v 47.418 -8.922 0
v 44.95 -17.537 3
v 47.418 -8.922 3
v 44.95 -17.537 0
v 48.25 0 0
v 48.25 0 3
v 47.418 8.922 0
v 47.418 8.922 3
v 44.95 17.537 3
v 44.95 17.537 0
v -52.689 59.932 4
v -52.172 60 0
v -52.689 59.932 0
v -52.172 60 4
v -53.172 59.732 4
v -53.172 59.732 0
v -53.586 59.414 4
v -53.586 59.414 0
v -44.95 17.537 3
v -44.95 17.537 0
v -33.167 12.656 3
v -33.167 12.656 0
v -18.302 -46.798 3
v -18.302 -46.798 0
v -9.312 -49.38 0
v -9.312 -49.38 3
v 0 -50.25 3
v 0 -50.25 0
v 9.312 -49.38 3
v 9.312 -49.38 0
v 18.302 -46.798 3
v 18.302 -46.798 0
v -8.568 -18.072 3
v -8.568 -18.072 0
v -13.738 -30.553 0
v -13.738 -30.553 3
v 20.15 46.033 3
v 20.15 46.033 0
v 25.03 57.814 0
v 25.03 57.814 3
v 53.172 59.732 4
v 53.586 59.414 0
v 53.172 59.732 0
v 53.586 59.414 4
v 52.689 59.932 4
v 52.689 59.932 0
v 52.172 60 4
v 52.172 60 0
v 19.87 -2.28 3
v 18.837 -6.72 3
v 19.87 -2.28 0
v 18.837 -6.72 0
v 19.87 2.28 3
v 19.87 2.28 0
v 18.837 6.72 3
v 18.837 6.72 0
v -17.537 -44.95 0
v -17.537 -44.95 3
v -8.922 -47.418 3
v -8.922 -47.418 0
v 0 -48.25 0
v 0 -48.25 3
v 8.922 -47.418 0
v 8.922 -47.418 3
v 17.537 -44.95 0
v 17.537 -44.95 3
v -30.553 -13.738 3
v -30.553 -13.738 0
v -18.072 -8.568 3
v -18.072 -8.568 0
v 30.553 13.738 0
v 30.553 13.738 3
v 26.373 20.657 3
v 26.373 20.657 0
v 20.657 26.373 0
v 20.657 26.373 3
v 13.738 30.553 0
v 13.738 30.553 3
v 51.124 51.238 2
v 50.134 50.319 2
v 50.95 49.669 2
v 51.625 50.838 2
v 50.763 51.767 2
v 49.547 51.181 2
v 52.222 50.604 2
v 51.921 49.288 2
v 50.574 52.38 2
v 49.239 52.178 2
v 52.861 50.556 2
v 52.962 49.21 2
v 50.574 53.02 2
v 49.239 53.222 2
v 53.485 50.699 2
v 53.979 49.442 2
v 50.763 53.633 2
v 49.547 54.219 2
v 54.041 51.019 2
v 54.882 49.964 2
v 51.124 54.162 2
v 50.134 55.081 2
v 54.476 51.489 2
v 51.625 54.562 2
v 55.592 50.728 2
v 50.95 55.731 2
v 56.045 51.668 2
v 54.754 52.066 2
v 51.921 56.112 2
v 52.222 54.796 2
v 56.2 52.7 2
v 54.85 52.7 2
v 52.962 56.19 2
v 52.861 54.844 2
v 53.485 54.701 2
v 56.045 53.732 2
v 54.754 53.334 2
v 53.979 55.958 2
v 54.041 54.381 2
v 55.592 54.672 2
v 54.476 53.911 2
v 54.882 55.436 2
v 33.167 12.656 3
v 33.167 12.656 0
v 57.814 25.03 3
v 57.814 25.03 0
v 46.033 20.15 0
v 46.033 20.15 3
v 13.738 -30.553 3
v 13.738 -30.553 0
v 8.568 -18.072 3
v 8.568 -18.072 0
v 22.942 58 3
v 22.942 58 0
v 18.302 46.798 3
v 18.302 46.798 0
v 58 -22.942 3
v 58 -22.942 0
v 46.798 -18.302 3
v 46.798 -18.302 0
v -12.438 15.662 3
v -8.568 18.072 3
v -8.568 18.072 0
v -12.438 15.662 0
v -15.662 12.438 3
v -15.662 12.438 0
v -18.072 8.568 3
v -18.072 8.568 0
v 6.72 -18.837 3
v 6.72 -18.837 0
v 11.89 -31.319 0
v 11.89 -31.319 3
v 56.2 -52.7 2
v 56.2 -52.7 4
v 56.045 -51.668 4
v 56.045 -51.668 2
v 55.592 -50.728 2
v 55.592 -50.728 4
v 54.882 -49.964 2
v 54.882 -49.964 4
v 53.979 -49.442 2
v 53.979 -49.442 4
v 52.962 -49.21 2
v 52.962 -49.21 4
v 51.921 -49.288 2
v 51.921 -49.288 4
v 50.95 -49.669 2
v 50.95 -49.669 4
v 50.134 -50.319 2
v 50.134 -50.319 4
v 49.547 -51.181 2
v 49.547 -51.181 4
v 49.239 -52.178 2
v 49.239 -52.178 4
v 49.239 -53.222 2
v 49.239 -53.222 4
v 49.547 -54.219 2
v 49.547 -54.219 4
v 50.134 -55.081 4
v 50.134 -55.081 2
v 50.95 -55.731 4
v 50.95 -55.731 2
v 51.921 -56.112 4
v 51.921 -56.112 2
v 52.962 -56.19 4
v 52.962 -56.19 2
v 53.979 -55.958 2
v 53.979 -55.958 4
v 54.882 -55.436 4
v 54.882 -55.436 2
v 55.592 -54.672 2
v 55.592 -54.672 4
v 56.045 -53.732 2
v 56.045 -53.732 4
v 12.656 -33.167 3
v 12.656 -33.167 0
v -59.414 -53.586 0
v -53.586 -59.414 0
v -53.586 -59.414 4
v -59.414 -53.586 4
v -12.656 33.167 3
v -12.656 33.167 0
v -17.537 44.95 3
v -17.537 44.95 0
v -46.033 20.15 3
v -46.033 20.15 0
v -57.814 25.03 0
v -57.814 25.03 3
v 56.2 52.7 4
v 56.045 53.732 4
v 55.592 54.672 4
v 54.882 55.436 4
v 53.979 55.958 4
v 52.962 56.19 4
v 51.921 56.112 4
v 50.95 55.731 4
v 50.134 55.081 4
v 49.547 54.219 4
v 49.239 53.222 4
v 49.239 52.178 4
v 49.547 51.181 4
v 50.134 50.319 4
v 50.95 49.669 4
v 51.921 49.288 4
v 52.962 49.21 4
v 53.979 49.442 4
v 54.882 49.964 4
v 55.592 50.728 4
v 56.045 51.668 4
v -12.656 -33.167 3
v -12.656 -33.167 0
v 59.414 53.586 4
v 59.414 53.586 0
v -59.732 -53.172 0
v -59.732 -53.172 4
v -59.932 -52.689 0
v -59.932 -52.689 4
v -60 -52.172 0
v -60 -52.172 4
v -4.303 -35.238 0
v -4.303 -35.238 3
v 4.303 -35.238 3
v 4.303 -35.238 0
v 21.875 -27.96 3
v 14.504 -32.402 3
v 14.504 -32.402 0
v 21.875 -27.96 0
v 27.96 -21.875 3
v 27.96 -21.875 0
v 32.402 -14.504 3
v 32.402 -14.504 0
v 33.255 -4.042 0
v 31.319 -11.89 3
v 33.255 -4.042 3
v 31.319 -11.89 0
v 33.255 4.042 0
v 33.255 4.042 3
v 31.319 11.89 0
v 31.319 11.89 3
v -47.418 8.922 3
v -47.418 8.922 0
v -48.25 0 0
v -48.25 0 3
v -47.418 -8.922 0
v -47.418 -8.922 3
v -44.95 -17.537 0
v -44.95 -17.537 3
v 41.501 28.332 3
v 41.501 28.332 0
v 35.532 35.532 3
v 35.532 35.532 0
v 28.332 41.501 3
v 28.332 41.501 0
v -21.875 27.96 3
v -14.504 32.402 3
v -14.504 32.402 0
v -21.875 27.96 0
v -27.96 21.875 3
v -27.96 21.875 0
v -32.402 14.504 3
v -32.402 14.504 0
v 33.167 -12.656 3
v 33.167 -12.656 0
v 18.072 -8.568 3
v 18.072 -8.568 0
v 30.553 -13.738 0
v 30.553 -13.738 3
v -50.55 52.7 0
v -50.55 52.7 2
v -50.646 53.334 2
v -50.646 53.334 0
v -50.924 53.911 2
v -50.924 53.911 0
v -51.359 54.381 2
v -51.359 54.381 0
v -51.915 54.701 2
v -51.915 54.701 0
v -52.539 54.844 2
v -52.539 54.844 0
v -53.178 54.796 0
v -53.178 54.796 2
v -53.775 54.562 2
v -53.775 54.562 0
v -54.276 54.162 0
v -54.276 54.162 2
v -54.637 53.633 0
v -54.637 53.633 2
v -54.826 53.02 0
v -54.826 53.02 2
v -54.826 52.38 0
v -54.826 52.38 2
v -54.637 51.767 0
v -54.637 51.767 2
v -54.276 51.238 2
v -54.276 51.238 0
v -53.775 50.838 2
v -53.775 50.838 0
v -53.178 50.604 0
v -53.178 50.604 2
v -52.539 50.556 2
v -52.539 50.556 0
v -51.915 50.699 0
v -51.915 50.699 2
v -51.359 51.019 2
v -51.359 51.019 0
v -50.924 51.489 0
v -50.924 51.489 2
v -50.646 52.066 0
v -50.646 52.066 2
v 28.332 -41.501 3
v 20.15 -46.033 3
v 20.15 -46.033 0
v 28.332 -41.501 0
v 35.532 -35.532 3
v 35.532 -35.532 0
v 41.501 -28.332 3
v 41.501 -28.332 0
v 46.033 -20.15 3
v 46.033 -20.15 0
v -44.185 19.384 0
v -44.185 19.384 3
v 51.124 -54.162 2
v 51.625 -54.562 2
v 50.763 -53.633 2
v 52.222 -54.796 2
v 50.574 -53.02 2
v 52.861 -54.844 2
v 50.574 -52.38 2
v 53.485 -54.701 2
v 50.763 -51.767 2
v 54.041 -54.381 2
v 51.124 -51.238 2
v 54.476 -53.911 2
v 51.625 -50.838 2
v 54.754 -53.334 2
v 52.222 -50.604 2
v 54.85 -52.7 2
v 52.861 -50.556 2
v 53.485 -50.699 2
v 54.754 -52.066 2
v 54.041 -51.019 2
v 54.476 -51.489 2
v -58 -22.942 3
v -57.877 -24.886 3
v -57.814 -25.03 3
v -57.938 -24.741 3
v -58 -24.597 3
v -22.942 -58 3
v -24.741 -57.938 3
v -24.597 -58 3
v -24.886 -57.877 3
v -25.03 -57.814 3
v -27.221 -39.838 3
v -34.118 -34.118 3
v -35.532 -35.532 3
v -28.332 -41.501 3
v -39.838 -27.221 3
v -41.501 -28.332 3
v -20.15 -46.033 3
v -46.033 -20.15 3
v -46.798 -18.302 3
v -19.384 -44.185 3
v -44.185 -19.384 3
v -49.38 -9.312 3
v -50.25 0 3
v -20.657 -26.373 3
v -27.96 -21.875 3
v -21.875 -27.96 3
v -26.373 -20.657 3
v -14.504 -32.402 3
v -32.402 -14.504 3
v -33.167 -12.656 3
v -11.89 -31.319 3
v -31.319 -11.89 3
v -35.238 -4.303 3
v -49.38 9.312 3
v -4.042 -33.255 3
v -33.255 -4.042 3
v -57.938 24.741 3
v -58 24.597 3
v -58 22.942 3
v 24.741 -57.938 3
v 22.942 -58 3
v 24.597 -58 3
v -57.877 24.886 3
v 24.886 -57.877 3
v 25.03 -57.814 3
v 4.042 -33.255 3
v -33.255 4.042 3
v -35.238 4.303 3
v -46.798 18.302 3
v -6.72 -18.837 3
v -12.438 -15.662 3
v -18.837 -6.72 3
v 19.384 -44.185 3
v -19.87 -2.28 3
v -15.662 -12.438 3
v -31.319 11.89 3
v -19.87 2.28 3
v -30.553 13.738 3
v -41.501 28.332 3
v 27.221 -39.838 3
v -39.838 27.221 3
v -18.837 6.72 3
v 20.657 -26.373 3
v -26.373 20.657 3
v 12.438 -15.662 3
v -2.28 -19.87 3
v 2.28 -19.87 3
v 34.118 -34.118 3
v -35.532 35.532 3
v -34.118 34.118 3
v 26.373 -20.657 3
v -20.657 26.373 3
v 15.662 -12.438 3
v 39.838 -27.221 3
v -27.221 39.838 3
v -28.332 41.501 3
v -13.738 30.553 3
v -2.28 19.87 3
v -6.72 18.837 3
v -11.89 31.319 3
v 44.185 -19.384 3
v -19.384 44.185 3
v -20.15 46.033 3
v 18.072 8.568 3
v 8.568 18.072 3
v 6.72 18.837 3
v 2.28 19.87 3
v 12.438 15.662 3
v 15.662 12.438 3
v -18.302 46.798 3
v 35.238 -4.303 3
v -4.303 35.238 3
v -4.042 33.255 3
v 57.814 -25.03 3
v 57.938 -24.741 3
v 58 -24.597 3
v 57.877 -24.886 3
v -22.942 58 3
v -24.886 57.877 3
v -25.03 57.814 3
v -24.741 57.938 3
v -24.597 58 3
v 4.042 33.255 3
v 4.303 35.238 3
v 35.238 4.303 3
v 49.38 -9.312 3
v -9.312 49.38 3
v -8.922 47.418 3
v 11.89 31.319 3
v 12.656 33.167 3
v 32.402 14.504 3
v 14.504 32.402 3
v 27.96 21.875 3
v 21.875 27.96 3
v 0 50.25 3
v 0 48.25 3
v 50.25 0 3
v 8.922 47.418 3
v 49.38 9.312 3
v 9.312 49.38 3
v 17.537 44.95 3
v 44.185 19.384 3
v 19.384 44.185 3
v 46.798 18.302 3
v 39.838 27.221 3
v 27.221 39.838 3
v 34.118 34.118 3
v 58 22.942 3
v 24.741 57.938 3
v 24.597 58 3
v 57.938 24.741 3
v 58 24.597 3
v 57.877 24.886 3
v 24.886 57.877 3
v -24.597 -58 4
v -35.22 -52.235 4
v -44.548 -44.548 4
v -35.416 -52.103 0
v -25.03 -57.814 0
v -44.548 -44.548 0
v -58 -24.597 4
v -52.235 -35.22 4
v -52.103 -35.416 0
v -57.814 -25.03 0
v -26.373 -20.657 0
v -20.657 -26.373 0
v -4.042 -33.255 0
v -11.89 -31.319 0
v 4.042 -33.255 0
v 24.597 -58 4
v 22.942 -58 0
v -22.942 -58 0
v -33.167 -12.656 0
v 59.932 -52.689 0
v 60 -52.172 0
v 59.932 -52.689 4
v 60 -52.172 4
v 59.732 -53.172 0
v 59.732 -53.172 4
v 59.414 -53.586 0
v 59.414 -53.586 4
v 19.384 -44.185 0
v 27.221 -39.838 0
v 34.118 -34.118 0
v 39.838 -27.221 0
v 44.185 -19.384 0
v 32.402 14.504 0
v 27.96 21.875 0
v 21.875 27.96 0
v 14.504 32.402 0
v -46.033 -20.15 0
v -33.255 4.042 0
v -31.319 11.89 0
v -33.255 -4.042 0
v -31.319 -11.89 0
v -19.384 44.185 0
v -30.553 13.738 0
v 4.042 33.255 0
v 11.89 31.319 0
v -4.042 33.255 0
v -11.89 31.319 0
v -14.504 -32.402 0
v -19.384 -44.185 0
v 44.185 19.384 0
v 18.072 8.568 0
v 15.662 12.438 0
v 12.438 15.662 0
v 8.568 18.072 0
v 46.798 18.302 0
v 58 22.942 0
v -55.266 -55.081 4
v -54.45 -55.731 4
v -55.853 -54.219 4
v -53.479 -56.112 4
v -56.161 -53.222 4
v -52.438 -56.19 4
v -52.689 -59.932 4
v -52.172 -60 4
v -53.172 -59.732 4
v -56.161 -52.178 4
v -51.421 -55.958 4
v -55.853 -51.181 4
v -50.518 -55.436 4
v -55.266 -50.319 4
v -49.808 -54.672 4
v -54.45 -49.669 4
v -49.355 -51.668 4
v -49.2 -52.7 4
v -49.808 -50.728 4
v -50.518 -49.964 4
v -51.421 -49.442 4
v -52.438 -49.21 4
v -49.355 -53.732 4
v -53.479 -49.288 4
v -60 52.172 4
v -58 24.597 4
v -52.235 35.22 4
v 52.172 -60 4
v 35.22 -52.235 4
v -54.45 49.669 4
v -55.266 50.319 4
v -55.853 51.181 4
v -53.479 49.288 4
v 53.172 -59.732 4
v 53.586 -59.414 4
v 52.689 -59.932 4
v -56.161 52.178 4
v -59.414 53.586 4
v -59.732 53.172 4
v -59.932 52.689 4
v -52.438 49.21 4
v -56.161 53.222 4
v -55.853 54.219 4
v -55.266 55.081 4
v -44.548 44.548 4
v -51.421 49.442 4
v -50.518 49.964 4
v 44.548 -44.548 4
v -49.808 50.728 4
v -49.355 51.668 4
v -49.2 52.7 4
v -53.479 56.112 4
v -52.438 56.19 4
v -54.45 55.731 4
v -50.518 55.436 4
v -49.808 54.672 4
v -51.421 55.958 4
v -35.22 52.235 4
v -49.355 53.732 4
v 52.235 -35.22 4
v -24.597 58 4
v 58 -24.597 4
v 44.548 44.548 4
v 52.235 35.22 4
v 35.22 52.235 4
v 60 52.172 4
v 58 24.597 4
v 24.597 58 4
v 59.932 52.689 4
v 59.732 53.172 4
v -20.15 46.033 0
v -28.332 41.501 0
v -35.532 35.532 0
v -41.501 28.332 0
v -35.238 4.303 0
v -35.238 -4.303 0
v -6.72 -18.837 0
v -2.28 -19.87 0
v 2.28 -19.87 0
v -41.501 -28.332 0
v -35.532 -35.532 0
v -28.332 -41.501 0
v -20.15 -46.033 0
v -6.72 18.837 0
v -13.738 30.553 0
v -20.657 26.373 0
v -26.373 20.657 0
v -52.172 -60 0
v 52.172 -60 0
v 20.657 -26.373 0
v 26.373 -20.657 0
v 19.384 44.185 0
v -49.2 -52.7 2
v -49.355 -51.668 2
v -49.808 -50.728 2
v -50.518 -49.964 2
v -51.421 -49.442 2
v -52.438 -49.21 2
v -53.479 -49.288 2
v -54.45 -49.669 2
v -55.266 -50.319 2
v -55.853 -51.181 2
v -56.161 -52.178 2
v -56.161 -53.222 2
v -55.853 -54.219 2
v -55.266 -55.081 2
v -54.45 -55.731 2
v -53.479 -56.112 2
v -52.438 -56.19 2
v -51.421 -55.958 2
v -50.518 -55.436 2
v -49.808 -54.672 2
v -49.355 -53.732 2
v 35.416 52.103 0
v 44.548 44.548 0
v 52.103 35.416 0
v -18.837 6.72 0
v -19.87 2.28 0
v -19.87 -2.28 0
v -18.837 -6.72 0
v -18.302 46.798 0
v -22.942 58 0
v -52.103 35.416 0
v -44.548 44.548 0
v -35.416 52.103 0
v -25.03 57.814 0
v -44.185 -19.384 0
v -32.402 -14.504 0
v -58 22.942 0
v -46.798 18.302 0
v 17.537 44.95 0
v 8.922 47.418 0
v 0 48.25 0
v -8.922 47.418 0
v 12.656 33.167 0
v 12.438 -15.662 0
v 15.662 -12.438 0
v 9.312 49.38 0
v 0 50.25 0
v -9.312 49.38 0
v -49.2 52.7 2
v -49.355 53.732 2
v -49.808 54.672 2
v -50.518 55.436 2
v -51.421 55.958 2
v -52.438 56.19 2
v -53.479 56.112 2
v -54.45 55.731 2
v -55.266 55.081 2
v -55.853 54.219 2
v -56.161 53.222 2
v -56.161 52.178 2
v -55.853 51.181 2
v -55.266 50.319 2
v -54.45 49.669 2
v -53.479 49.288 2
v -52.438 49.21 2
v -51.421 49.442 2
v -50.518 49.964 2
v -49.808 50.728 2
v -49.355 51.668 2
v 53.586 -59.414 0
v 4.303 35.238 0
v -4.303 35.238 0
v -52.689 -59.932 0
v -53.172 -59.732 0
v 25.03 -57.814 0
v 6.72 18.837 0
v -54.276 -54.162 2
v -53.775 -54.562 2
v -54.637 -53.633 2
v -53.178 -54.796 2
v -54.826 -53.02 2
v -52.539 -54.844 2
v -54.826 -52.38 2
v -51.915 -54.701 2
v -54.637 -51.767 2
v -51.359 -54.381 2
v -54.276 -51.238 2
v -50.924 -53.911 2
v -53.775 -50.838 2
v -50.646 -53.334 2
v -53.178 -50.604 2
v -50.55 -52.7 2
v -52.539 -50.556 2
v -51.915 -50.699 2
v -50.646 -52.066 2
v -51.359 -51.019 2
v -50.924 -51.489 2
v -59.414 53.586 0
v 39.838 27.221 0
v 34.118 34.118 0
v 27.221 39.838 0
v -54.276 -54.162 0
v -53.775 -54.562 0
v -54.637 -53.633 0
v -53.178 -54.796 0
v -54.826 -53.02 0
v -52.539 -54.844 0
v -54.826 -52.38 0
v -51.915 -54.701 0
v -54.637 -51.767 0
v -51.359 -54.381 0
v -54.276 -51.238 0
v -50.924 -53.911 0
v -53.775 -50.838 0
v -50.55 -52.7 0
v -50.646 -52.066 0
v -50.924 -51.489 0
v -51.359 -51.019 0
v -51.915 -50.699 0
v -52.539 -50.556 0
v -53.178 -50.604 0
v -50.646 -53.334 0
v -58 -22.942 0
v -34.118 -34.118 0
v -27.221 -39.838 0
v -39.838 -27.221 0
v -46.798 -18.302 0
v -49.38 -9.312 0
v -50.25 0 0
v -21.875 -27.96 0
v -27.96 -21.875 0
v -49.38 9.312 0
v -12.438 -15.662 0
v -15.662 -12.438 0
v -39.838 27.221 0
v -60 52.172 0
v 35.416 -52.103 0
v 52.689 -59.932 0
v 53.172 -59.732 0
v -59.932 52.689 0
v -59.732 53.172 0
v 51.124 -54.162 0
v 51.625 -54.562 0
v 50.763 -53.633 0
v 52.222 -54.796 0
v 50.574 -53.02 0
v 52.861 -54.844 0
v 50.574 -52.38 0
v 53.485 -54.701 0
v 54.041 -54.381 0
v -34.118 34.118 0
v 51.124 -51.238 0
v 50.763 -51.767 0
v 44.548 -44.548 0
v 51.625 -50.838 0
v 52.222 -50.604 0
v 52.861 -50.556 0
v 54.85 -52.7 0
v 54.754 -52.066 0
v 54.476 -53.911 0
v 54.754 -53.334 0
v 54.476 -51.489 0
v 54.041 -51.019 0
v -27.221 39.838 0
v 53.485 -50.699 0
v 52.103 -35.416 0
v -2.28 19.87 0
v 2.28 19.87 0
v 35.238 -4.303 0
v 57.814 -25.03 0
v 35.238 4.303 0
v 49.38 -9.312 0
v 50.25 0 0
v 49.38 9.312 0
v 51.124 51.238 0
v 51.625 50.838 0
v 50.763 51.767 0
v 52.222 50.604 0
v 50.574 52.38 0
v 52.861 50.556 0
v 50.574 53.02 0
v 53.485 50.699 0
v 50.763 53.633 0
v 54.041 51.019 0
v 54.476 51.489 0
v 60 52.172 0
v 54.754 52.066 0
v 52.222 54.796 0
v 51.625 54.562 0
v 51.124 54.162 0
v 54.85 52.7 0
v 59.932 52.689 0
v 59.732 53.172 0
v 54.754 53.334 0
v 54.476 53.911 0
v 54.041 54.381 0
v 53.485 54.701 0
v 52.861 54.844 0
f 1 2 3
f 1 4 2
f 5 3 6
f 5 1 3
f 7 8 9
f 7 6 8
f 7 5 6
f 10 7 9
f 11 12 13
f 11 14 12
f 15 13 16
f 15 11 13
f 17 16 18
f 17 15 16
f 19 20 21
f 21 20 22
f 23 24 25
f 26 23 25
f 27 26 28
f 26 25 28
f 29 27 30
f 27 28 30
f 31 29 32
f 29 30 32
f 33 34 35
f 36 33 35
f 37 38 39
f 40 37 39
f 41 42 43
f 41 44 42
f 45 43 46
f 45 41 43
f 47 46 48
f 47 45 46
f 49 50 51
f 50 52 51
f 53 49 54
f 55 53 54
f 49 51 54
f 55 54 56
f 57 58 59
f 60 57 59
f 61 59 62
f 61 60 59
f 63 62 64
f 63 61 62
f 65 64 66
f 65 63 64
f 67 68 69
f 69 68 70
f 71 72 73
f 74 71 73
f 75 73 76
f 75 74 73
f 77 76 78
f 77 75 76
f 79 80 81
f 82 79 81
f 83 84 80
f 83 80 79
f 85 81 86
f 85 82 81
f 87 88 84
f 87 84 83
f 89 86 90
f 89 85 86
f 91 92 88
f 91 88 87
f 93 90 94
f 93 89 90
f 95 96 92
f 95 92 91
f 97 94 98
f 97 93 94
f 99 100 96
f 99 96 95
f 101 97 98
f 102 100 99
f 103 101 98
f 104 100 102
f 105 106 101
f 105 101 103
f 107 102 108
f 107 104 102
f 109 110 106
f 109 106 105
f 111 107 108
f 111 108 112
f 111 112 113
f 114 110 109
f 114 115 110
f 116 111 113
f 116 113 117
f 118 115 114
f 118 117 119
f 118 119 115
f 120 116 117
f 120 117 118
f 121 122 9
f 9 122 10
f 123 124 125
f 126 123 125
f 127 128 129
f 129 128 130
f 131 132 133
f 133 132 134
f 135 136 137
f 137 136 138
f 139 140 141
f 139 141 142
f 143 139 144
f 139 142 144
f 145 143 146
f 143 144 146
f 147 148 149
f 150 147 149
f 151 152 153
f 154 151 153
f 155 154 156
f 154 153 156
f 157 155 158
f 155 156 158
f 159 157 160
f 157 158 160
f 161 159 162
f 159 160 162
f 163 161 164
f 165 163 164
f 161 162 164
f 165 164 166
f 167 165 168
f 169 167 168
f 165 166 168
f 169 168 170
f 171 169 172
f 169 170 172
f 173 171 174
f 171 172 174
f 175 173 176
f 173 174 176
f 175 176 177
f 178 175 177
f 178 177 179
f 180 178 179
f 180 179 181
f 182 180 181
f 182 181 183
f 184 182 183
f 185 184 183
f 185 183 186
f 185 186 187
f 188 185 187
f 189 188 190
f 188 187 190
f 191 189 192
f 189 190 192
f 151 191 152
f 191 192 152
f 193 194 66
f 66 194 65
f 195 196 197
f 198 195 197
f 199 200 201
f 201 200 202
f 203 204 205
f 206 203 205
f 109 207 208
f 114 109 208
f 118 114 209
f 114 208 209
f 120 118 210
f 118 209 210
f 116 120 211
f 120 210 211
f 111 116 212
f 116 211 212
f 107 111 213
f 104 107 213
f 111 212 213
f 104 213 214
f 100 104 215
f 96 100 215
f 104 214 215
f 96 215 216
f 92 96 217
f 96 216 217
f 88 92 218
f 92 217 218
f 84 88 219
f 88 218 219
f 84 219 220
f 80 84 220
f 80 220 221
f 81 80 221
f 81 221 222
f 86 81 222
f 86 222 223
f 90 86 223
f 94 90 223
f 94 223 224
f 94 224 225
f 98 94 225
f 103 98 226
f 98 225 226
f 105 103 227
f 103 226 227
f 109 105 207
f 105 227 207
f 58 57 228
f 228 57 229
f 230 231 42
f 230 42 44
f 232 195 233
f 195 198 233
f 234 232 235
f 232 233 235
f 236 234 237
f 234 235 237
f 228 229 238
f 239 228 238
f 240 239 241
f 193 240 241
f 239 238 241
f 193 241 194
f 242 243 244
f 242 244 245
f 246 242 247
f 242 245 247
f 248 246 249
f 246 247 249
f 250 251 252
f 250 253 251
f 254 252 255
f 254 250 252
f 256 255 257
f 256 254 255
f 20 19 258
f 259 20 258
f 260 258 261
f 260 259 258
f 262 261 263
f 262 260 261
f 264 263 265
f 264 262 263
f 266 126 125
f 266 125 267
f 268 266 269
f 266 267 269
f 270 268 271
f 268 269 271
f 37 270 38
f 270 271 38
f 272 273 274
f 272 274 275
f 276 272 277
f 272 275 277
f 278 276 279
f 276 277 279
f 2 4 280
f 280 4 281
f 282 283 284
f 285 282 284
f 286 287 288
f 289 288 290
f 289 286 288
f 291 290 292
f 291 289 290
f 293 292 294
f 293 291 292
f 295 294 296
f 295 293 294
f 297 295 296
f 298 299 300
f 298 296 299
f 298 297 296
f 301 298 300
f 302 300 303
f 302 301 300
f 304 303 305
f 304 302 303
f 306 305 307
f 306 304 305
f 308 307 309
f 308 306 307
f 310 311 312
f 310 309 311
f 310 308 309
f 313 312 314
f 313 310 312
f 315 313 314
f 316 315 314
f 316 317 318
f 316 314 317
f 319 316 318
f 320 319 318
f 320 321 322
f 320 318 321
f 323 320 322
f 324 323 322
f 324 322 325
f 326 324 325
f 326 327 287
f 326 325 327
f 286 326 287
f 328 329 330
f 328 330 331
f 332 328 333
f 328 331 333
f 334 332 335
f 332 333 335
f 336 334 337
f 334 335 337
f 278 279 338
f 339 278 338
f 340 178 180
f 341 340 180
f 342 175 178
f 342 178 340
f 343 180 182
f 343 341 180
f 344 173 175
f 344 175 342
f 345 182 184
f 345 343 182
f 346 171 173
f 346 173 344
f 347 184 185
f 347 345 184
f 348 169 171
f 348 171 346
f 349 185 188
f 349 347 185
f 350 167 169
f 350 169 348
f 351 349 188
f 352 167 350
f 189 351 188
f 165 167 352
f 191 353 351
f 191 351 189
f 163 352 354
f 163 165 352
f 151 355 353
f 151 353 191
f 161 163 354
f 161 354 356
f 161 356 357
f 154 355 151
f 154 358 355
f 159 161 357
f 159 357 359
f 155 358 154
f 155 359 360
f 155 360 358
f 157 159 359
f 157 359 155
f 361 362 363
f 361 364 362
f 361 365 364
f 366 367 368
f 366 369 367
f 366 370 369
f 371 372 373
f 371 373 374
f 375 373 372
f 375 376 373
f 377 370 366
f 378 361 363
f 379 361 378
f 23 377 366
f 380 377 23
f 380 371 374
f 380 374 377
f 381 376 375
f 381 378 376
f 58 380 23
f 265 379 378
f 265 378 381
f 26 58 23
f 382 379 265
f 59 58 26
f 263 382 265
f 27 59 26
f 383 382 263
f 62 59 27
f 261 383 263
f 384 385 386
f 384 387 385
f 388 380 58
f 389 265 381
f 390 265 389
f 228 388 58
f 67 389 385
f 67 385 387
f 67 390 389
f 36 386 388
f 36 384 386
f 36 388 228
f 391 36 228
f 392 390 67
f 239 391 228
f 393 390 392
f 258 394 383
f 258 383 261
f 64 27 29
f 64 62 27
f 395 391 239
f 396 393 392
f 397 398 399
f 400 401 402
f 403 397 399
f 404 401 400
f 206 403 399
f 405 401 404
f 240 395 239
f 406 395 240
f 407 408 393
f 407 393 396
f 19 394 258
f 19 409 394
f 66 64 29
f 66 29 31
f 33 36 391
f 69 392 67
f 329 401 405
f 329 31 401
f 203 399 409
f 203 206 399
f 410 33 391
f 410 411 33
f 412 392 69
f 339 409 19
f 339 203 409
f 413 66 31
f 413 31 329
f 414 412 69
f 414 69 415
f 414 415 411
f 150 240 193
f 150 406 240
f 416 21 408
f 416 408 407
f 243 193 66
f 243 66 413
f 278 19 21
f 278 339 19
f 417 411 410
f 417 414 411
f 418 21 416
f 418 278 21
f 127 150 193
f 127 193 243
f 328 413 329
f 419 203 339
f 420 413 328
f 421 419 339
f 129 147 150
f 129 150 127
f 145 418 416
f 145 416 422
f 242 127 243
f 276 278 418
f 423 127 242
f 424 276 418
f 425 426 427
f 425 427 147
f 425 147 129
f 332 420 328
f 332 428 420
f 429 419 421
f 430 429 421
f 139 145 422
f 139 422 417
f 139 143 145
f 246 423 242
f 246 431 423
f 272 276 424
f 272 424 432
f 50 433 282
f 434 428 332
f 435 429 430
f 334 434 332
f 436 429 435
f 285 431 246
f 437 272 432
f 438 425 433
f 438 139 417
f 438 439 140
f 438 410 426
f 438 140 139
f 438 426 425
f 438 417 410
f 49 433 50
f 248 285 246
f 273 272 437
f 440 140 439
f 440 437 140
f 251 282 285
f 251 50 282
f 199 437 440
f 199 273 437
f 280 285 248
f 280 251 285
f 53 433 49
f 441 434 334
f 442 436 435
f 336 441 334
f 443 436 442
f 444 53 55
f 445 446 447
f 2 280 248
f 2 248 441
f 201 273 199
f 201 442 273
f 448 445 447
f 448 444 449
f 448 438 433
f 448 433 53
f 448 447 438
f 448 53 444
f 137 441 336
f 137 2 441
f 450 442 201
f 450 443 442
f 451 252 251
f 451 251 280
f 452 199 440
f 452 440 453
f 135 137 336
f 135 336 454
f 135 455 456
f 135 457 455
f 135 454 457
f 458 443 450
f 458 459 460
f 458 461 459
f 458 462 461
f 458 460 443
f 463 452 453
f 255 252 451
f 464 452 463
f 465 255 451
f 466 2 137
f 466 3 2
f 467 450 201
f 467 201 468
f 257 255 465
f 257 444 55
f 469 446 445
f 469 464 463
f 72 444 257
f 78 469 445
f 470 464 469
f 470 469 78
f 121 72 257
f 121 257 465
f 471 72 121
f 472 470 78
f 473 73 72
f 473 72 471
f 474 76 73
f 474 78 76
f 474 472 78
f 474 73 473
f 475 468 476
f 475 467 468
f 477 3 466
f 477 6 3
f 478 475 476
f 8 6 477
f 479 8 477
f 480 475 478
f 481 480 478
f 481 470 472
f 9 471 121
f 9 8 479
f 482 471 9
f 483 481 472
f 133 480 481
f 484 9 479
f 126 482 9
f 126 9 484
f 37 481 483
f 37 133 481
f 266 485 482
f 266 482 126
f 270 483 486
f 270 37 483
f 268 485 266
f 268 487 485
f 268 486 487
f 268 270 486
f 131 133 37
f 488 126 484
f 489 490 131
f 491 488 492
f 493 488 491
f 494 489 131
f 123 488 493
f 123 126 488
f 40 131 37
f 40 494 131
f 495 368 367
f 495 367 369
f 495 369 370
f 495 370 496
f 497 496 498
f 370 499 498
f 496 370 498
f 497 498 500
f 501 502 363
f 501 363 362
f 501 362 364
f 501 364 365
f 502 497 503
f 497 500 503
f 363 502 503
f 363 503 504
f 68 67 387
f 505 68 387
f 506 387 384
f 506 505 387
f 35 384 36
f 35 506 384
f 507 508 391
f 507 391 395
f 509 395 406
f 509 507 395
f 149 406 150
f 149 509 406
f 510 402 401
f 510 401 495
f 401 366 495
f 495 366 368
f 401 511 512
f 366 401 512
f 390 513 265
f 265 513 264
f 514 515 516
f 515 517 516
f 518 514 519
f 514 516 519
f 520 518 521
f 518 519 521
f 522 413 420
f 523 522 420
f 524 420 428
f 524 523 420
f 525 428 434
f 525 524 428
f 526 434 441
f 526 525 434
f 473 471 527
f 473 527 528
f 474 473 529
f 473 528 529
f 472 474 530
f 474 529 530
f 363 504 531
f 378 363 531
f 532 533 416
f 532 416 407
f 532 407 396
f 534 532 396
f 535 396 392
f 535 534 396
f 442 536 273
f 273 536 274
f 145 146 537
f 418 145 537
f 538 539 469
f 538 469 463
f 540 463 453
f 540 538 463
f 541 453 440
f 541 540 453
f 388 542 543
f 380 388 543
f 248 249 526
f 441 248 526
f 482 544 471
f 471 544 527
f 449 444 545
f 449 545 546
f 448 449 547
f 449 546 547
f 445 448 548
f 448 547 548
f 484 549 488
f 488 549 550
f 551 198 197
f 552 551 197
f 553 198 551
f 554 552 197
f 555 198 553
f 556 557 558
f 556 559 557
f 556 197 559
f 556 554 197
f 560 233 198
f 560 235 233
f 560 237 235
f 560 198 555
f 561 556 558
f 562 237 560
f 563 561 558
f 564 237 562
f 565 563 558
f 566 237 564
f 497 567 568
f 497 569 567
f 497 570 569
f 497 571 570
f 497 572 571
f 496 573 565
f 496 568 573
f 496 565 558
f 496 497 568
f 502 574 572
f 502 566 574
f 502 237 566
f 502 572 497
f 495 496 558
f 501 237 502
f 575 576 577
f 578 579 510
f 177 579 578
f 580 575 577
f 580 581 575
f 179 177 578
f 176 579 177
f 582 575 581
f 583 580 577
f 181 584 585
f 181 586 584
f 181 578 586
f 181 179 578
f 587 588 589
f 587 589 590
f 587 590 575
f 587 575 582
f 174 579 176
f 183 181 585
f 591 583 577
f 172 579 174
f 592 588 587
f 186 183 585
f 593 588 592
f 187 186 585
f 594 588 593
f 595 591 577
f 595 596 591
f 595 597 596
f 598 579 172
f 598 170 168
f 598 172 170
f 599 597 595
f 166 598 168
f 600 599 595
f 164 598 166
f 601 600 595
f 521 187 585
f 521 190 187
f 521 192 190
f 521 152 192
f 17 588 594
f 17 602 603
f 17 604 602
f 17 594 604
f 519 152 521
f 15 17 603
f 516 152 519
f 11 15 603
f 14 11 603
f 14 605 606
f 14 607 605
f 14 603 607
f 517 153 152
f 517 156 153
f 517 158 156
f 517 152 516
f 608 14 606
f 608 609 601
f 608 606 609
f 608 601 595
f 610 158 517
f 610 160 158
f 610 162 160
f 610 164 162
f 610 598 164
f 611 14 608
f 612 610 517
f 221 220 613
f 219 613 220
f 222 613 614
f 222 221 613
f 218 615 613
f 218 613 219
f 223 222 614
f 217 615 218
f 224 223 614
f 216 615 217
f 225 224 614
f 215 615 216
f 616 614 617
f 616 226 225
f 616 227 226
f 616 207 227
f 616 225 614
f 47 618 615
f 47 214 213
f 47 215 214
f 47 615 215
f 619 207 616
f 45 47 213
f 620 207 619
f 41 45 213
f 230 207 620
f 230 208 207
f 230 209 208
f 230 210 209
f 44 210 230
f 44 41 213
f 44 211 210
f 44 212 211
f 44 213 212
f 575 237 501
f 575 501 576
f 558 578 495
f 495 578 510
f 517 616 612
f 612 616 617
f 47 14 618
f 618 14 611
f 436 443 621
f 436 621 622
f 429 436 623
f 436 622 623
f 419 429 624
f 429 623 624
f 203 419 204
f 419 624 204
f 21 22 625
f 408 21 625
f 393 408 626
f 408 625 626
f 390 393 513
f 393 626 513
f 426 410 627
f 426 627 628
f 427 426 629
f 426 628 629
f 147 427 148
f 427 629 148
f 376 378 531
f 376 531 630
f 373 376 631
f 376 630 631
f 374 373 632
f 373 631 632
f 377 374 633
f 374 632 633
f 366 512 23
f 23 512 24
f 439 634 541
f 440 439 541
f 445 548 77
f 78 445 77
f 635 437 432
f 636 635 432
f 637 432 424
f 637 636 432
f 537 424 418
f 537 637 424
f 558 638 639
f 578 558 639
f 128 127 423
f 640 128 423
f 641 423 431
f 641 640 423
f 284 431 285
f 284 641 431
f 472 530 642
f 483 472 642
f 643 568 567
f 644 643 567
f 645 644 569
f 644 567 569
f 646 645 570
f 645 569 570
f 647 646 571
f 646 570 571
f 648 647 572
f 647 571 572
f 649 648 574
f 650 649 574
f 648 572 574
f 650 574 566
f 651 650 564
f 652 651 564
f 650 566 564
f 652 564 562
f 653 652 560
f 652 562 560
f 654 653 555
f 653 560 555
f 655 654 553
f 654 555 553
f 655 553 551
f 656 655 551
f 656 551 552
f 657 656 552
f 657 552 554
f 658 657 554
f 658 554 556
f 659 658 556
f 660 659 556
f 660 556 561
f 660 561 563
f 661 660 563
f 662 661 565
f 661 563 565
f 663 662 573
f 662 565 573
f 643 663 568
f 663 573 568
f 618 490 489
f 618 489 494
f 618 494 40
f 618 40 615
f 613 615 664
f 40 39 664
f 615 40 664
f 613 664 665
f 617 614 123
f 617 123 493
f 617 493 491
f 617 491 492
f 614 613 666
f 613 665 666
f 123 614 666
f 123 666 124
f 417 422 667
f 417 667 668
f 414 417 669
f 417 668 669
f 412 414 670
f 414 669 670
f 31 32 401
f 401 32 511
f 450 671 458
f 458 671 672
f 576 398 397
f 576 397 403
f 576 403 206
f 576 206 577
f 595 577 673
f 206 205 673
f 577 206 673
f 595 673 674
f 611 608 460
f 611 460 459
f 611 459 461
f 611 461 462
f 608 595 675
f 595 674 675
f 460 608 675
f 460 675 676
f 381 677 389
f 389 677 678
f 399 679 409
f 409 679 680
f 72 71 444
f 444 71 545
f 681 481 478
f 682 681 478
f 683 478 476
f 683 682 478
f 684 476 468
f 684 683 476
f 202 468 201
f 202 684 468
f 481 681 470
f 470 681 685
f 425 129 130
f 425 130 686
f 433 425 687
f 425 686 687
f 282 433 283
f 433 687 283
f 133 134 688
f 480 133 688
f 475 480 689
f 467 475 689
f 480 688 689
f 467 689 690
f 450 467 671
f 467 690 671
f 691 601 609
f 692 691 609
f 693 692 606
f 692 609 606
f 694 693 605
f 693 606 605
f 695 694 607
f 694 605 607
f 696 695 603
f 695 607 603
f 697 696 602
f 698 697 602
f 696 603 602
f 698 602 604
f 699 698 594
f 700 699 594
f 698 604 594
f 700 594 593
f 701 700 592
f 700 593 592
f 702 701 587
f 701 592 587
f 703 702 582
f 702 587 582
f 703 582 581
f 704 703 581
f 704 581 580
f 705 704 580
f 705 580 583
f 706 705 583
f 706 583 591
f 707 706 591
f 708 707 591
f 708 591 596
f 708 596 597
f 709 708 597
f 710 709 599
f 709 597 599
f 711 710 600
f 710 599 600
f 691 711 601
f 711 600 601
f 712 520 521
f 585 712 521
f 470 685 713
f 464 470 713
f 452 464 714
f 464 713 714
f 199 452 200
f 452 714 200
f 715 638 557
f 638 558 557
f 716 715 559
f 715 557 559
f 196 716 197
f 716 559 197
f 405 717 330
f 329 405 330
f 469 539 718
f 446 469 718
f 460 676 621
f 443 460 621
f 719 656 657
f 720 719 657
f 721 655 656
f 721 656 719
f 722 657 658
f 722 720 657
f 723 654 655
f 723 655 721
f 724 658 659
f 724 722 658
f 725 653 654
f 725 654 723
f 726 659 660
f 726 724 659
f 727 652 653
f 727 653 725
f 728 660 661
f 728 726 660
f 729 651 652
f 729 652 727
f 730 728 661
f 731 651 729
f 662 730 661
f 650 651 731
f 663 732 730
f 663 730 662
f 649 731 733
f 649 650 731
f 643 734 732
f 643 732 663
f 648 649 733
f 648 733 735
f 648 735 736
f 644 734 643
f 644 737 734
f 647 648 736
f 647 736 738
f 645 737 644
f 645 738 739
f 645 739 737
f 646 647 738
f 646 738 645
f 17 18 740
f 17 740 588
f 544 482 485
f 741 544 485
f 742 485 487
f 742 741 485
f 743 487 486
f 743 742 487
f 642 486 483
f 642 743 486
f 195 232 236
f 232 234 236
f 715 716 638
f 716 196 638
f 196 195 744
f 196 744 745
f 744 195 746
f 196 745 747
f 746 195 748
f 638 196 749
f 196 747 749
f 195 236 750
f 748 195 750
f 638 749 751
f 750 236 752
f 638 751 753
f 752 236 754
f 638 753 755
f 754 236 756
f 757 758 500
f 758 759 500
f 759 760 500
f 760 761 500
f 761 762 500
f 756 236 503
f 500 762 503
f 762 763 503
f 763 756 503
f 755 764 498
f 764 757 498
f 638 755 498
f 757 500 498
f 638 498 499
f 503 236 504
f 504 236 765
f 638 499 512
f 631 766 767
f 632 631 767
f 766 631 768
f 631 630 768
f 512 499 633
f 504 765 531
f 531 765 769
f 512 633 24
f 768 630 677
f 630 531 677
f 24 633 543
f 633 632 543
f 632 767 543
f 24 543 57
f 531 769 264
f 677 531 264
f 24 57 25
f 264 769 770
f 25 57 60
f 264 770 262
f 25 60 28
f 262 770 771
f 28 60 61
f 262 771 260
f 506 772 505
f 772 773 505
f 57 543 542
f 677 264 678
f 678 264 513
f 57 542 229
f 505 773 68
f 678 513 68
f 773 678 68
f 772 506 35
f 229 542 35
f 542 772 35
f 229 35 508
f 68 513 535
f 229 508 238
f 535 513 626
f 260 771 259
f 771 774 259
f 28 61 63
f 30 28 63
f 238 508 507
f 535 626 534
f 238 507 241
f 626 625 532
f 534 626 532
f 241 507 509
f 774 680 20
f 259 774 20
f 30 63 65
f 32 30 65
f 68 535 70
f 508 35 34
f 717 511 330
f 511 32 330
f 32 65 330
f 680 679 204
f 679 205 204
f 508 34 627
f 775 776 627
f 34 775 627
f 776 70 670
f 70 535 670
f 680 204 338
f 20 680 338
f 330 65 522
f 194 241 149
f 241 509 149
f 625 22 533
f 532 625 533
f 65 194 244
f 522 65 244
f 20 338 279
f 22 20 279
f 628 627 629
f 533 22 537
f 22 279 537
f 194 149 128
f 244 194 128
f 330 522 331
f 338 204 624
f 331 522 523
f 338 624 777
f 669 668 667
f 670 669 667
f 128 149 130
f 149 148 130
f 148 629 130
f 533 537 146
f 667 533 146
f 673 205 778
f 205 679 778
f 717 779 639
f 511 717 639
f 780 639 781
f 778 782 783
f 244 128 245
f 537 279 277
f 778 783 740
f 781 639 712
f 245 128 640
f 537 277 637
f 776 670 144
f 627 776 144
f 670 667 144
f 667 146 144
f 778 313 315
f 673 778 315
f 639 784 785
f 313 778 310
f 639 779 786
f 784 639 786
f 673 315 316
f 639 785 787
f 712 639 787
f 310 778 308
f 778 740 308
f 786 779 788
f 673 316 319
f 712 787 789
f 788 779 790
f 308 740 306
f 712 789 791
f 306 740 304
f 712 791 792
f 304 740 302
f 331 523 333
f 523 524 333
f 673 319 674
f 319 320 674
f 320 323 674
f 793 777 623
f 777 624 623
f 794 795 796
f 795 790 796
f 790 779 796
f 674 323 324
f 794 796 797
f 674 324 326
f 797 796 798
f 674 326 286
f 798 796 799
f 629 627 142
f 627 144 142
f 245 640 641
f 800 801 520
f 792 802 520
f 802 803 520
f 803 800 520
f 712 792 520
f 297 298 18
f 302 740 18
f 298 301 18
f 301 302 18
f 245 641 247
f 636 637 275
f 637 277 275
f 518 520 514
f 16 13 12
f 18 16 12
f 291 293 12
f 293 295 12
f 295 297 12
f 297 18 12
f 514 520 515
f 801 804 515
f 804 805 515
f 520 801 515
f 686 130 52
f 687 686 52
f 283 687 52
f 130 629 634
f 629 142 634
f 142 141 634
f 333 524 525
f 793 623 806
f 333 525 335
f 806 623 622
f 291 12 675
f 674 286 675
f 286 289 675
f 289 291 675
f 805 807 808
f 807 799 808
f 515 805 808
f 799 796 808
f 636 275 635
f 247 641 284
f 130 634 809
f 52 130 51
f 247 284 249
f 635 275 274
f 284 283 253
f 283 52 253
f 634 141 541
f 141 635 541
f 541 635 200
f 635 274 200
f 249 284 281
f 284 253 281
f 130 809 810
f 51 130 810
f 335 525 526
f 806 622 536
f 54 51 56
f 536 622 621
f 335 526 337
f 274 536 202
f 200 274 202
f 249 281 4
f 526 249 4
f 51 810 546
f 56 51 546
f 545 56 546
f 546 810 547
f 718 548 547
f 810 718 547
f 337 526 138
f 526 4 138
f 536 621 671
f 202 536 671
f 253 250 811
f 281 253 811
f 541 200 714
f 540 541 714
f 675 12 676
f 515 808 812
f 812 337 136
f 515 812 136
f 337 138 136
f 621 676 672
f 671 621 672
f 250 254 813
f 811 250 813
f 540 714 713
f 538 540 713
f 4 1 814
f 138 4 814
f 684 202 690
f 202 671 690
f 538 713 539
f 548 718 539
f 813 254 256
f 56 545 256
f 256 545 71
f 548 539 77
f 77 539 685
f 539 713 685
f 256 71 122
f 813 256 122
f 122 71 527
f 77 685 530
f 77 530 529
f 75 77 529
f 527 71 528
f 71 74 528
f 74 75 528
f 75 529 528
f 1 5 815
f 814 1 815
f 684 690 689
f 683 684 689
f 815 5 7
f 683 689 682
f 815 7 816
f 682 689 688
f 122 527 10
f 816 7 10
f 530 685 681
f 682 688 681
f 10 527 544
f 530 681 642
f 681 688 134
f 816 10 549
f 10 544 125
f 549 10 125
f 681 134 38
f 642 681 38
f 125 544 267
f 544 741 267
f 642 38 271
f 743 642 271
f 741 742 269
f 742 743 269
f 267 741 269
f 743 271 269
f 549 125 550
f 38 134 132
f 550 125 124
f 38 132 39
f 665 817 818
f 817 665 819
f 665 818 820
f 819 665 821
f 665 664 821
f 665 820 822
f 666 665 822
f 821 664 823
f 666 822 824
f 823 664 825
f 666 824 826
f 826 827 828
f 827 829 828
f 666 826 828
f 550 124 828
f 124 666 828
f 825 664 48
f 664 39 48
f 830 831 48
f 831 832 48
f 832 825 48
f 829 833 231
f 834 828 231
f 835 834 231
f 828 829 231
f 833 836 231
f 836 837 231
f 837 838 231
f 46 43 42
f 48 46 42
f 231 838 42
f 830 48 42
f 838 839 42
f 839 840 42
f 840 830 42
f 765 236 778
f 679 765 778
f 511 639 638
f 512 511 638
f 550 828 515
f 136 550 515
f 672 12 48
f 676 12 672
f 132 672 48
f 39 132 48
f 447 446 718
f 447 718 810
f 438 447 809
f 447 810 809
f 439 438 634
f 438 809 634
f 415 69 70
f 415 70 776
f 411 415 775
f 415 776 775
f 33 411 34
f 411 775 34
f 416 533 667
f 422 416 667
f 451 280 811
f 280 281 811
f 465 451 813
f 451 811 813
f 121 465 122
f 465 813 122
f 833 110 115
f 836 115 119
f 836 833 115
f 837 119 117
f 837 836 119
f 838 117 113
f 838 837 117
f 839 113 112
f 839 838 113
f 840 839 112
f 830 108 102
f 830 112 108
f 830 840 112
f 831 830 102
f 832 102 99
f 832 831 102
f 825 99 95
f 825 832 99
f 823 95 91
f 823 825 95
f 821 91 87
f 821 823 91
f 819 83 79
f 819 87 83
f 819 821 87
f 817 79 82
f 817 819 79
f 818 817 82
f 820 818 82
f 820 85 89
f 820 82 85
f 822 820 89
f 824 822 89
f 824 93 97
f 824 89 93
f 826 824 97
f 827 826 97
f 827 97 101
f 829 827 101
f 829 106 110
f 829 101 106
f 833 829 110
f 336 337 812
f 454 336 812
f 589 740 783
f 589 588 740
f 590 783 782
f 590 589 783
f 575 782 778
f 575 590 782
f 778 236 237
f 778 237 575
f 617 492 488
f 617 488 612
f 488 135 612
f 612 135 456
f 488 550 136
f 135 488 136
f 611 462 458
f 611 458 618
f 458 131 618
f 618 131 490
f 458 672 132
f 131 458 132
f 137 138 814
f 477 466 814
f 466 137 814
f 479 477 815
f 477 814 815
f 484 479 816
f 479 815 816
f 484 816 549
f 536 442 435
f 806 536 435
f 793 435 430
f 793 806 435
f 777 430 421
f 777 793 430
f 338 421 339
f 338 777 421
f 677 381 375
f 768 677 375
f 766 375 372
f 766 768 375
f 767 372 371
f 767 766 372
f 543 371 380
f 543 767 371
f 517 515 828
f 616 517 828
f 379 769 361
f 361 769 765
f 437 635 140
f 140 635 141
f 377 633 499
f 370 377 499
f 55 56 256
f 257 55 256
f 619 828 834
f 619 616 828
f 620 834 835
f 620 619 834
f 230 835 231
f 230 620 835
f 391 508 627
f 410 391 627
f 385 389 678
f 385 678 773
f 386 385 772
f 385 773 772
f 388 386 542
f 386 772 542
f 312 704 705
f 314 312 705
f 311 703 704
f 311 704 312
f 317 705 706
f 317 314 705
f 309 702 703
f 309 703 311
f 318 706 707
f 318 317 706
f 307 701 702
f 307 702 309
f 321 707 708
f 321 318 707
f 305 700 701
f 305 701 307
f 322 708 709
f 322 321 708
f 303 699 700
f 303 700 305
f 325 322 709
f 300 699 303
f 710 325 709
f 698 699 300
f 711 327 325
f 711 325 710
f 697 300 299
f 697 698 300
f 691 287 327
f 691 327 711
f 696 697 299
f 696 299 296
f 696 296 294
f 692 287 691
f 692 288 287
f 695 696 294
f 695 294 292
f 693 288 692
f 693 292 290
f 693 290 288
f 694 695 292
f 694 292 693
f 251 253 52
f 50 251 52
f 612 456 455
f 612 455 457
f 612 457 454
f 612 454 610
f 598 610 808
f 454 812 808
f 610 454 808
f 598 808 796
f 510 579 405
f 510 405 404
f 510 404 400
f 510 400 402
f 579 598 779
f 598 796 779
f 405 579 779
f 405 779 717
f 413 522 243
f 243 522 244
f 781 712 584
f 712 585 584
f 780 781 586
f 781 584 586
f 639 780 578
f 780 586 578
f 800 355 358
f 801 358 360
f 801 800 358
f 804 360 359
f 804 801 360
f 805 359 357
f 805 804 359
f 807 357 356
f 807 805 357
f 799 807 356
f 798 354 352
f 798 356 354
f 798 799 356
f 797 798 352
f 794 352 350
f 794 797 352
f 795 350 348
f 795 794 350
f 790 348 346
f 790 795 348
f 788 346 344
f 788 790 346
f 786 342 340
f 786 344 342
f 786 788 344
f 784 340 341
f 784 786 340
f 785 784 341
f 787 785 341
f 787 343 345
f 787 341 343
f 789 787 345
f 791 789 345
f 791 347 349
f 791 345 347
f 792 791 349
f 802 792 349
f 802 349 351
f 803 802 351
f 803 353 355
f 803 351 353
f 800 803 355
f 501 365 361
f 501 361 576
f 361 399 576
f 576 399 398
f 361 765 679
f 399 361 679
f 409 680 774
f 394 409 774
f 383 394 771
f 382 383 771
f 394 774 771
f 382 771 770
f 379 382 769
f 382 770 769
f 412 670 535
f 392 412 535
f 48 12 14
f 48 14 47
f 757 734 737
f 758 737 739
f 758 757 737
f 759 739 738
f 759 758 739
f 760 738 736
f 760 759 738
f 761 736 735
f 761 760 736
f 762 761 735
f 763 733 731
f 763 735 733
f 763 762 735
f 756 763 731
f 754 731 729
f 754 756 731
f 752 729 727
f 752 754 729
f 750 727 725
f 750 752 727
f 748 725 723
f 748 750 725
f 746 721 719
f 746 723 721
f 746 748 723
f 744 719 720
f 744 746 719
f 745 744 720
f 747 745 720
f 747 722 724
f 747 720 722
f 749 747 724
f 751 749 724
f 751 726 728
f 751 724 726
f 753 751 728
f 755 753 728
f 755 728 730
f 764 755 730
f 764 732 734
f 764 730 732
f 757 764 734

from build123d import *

# Parameters (mm, degrees)
SKETCH1_W           = 120
SKETCH1_H           = 120
SKETCH1_R           = 2.15
BOSS_EXTRUDE1_DEPTH = 4
CHAMFER1_SIZE       = 7
SKETCH2_R           = 20
BOSS_EXTRUDE2_DEPTH = 3
SKETCH3_R           = 50.25
SKETCH3_R_2         = 48.25
SKETCH3_R_3         = 35.5
SKETCH3_R_4         = 33.5
EXTRUDE_THIN1_DEPTH = 3
FILLET1_R           = 2
SKETCH4_R           = 3.5
CUT_EXTRUDE1_DEPTH  = 2


with BuildPart() as part:
    # Sketch1 → Boss-Extrude1 (new body)
    with BuildSketch(Plane.XY):
        Rectangle(SKETCH1_W, SKETCH1_H)
        with Locations((-52.7, 52.7)):
            Circle(SKETCH1_R, mode=Mode.SUBTRACT)
        with Locations((52.7, 52.7)):
            Circle(SKETCH1_R, mode=Mode.SUBTRACT)
        with Locations((-52.7, -52.7)):
            Circle(SKETCH1_R, mode=Mode.SUBTRACT)
        with Locations((52.7, -52.7)):
            Circle(SKETCH1_R, mode=Mode.SUBTRACT)
        with BuildLine():
            Line((-24.596747752, 58), (24.596747752, 58))
            ThreePointArc((24.596747752, 58), (44.547727215, 44.547727215), (58, 24.596747752))
            Line((58, 24.596747752), (58, -24.596747752))
            ThreePointArc((58, -24.596747752), (44.547727215, -44.547727215), (24.596747752, -58))
            Line((24.596747752, -58), (-24.596747752, -58))
            ThreePointArc((-24.596747752, -58), (-44.547727215, -44.547727215), (-58, -24.596747752))
            Line((-58, -24.596747752), (-58, 24.596747752))
            ThreePointArc((-58, 24.596747752), (-44.547727215, 44.547727215), (-24.596747752, 58))
        make_face(mode=Mode.SUBTRACT)
    extrude(amount=BOSS_EXTRUDE1_DEPTH)

    # Chamfer1
    chamfer1_edges = [part.edges().sort_by_distance(p)[0] for p in [
        (60, -60, 2),
        (-60, -60, 2),
        (-60, 60, 2),
        (60, 60, 2),
    ]]
    chamfer(chamfer1_edges, length=CHAMFER1_SIZE)



with BuildPart() as body_2:
    # Sketch2 → Boss-Extrude2 (new body)
    with BuildSketch(Plane.XY):
        Circle(SKETCH2_R)
    extrude(amount=BOSS_EXTRUDE2_DEPTH)


with BuildPart() as part_1:
    add(part.part)

    add(body_2.part)  # Extrude-Thin1 merges body 2
    # Sketch3 → Extrude-Thin1 (add)
    # profile 1 of 10: a face of its own
    with BuildSketch(Plane.XY):
        Circle(SKETCH3_R)
        Circle(SKETCH3_R_2, mode=Mode.SUBTRACT)
    # profile 2 of 10: a face of its own
    with BuildSketch(Plane.XY):
        Circle(SKETCH3_R_3)
        Circle(SKETCH3_R_4, mode=Mode.SUBTRACT)
    # profile 3 of 10: a face of its own
    with BuildSketch(Plane.XY):
        Polygon((7.620839599, 15.785208387), (25.12860663, 58.052696999), (23.280847565, 58.818063864), (5.773080534, 16.550575251), align=None)
    # profile 4 of 10: a face of its own
    with BuildSketch(Plane.XY):
        Polygon((16.550575251, 5.773080534), (58.818063864, 23.280847565), (58.052696999, 25.12860663), (15.785208387, 7.620839599), align=None)
    # profile 5 of 10: a face of its own
    with BuildSketch(Plane.XY):
        Polygon((15.785208387, -7.620839599), (58.052696999, -25.12860663), (58.818063864, -23.280847565), (16.550575251, -5.773080534), align=None)
    # profile 6 of 10: a face of its own
    with BuildSketch(Plane.XY):
        Polygon((5.773080534, -16.550575251), (23.280847565, -58.818063864), (25.12860663, -58.052696999), (7.620839599, -15.785208387), align=None)
    # profile 7 of 10: a face of its own
    with BuildSketch(Plane.XY):
        Polygon((-7.620839599, -15.785208387), (-25.12860663, -58.052696999), (-23.280847565, -58.818063864), (-5.773080534, -16.550575251), align=None)
    # profile 8 of 10: a face of its own
    with BuildSketch(Plane.XY):
        Polygon((-16.550575251, -5.773080534), (-58.818063864, -23.280847565), (-58.052696999, -25.12860663), (-15.785208387, -7.620839599), align=None)
    # profile 9 of 10: a face of its own
    with BuildSketch(Plane.XY):
        Polygon((-15.785208387, 7.620839599), (-58.052696999, 25.12860663), (-58.818063864, 23.280847565), (-16.550575251, 5.773080534), align=None)
    # profile 10 of 10: a face of its own
    with BuildSketch(Plane.XY):
        Polygon((-5.773080534, 16.550575251), (-23.280847565, 58.818063864), (-25.12860663, 58.052696999), (-7.620839599, 15.785208387), align=None)
    extrude(amount=EXTRUDE_THIN1_DEPTH)

    # Fillet1
    fillet1_edges = [part_1.edges().sort_by_distance(p)[0] for p in [
        (60, -53, 2),
        (60, 53, 2),
        (53, 60, 2),
        (-53, 60, 2),
        (-60, -53, 2),
        (-60, 53, 2),
        (-53, -60, 2),
        (53, -60, 2),
    ]]
    fillet(fillet1_edges, radius=FILLET1_R)

    # Sketch4 → Cut-Extrude1 (cut)
    with BuildSketch(Plane.XY.offset(4)):
        with Locations((-52.7, 52.7)):
            Circle(SKETCH4_R)
        with Locations((52.7, 52.7)):
            Circle(SKETCH4_R)
        with Locations((52.7, -52.7)):
            Circle(SKETCH4_R)
        with Locations((-52.7, -52.7)):
            Circle(SKETCH4_R)
    extrude(amount=-CUT_EXTRUDE1_DEPTH, mode=Mode.SUBTRACT)


solid = part_1.part
